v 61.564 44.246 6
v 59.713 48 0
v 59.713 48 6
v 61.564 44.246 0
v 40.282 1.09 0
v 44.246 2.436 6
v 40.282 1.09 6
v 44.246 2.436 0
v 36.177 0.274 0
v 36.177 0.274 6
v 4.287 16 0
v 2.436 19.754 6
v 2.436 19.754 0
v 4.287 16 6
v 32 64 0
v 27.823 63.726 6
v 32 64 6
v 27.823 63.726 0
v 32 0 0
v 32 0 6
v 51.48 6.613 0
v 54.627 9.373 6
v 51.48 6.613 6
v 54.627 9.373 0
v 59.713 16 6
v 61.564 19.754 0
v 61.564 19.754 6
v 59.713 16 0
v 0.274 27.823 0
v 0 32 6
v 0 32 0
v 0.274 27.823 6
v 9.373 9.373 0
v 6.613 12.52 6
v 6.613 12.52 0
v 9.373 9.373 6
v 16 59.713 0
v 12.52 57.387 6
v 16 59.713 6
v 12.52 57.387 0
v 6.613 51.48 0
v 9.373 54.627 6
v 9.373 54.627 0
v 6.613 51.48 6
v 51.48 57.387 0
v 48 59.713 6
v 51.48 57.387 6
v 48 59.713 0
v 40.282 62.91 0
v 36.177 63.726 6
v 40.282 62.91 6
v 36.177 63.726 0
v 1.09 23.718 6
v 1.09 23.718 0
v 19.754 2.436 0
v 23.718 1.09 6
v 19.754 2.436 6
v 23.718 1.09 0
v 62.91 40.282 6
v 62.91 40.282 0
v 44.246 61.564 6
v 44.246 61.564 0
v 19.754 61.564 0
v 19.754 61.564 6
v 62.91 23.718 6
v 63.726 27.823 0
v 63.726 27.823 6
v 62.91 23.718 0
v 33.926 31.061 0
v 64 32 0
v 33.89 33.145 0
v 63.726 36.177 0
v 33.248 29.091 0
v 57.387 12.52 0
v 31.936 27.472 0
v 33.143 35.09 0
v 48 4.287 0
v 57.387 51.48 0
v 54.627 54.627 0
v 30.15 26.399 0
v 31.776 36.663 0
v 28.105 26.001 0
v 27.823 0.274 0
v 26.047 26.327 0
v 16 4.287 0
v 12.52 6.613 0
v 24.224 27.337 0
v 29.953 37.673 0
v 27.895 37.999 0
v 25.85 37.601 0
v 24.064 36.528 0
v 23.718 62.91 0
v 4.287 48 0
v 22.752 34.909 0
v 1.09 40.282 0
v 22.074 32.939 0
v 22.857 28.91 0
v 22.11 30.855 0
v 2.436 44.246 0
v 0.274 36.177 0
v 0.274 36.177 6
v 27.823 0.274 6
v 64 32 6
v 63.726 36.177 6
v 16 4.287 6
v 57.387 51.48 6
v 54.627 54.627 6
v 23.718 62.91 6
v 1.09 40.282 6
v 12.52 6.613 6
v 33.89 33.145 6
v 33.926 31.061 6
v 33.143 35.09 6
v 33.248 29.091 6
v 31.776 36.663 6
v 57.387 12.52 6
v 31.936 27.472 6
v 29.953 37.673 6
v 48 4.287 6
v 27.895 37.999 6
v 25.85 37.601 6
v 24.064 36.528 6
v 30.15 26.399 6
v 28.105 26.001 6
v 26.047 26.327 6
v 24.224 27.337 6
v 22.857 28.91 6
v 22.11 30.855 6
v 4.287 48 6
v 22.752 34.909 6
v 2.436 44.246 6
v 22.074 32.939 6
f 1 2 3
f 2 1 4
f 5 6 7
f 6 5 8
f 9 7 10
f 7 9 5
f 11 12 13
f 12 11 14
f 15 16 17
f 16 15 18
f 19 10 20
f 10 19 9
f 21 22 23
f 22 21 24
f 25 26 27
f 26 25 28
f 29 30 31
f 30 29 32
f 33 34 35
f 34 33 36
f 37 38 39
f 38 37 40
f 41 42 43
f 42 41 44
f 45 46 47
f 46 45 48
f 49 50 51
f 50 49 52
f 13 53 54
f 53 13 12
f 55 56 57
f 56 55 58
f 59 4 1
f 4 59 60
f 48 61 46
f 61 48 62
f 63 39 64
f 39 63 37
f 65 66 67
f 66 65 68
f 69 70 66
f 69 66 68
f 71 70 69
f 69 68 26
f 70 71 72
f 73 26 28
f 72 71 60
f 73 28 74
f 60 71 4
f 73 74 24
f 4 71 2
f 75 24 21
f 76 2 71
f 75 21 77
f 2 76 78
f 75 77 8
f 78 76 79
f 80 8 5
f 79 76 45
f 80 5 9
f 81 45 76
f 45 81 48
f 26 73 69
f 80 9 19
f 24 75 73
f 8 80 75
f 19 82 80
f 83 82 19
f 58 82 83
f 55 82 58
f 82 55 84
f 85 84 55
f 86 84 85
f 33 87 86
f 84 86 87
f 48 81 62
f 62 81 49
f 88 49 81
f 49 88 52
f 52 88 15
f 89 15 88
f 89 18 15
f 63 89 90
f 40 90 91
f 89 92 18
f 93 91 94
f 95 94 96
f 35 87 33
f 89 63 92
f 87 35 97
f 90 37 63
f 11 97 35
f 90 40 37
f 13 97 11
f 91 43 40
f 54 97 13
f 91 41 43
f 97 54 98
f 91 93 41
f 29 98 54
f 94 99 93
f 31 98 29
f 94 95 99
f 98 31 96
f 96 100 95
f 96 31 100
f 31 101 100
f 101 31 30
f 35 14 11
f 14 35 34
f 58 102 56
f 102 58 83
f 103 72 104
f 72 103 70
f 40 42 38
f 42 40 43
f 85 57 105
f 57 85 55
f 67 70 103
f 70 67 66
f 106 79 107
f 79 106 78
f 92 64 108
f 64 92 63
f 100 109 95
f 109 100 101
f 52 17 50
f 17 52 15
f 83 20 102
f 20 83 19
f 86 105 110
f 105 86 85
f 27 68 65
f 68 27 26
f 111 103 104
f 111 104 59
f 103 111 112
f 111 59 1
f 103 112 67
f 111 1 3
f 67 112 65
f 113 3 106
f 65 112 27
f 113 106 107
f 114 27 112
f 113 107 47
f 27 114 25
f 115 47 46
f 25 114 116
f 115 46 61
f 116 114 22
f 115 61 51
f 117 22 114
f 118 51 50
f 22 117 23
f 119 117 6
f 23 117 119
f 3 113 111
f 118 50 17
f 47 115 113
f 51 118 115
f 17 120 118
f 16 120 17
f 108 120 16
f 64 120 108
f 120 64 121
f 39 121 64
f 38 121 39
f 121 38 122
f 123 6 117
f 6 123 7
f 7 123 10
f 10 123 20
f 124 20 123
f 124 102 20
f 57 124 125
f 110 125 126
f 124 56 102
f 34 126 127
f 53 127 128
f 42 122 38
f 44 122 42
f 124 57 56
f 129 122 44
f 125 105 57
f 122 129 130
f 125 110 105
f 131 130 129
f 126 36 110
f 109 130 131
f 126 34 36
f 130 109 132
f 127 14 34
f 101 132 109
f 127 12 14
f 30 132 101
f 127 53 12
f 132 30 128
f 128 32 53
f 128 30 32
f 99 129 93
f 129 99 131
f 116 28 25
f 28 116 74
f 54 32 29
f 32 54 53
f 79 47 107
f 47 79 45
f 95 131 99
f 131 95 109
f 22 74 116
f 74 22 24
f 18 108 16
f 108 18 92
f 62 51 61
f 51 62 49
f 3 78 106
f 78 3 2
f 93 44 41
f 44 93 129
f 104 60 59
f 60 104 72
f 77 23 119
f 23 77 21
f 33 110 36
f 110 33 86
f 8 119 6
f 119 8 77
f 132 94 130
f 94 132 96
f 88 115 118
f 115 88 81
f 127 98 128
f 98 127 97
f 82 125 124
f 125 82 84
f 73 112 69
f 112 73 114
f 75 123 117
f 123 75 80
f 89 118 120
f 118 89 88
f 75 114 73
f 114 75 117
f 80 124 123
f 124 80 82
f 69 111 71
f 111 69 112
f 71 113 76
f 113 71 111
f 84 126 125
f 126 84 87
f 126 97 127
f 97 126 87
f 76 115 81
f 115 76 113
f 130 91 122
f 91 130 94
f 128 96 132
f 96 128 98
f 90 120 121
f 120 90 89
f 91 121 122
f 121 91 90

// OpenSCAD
$fn = 32;

// ----------------------------------------------------------------------
// Cam plate: eccentric cam, base R32
// ----------------------------------------------------------------------

// --- parameters (mm) ---
base_r = 32;              // base circle radius
lobe_h = 14;              // cam lobe rise
bore_r = 6;               // shaft bore radius
plate_t = 6;              // plate thickness, Z (extrusion height)
ecc = 4;                  // disc eccentricity

profile = [[64, 32], [63.726, 36.177], [62.91, 40.282], [61.564, 44.246], [59.713, 48], [57.387, 51.48], [54.627, 54.627], [51.48, 57.387], [48, 59.713], [44.246, 61.564], [40.282, 62.91], [36.177, 63.726], [32, 64], [27.823, 63.726], [23.718, 62.91], [19.754, 61.564], [16, 59.713], [12.52, 57.387], [9.373, 54.627], [6.613, 51.48], [4.287, 48], [2.436, 44.246], [1.09, 40.282], [0.274, 36.177], [0, 32], [0.274, 27.823], [1.09, 23.718], [2.436, 19.754], [4.287, 16], [6.613, 12.52], [9.373, 9.373], [12.52, 6.613], [16, 4.287], [19.754, 2.436], [23.718, 1.09], [27.823, 0.274], [32, 0], [36.177, 0.274], [40.282, 1.09], [44.246, 2.436], [48, 4.287], [51.48, 6.613], [54.627, 9.373], [57.387, 12.52], [59.713, 16], [61.564, 19.754], [62.91, 23.718], [63.726, 27.823]];  // primary outline, 48 points, counter clockwise
void_1 = [[33.89, 33.145], [33.143, 35.09], [31.776, 36.663], [29.953, 37.673], [27.895, 37.999], [25.85, 37.601], [24.064, 36.528], [22.752, 34.909], [22.074, 32.939], [22.11, 30.855], [22.857, 28.91], [24.224, 27.337], [26.047, 26.327], [28.105, 26.001], [30.15, 26.399], [31.936, 27.472], [33.248, 29.091], [33.926, 31.061]];  // shaft bore, 18 points

// --- the one profile operation ---
difference() {
  linear_extrude(height = plate_t) polygon(points = profile);
  translate([0, 0, -1])
    linear_extrude(height = plate_t + 2) polygon(points = void_1);
}
